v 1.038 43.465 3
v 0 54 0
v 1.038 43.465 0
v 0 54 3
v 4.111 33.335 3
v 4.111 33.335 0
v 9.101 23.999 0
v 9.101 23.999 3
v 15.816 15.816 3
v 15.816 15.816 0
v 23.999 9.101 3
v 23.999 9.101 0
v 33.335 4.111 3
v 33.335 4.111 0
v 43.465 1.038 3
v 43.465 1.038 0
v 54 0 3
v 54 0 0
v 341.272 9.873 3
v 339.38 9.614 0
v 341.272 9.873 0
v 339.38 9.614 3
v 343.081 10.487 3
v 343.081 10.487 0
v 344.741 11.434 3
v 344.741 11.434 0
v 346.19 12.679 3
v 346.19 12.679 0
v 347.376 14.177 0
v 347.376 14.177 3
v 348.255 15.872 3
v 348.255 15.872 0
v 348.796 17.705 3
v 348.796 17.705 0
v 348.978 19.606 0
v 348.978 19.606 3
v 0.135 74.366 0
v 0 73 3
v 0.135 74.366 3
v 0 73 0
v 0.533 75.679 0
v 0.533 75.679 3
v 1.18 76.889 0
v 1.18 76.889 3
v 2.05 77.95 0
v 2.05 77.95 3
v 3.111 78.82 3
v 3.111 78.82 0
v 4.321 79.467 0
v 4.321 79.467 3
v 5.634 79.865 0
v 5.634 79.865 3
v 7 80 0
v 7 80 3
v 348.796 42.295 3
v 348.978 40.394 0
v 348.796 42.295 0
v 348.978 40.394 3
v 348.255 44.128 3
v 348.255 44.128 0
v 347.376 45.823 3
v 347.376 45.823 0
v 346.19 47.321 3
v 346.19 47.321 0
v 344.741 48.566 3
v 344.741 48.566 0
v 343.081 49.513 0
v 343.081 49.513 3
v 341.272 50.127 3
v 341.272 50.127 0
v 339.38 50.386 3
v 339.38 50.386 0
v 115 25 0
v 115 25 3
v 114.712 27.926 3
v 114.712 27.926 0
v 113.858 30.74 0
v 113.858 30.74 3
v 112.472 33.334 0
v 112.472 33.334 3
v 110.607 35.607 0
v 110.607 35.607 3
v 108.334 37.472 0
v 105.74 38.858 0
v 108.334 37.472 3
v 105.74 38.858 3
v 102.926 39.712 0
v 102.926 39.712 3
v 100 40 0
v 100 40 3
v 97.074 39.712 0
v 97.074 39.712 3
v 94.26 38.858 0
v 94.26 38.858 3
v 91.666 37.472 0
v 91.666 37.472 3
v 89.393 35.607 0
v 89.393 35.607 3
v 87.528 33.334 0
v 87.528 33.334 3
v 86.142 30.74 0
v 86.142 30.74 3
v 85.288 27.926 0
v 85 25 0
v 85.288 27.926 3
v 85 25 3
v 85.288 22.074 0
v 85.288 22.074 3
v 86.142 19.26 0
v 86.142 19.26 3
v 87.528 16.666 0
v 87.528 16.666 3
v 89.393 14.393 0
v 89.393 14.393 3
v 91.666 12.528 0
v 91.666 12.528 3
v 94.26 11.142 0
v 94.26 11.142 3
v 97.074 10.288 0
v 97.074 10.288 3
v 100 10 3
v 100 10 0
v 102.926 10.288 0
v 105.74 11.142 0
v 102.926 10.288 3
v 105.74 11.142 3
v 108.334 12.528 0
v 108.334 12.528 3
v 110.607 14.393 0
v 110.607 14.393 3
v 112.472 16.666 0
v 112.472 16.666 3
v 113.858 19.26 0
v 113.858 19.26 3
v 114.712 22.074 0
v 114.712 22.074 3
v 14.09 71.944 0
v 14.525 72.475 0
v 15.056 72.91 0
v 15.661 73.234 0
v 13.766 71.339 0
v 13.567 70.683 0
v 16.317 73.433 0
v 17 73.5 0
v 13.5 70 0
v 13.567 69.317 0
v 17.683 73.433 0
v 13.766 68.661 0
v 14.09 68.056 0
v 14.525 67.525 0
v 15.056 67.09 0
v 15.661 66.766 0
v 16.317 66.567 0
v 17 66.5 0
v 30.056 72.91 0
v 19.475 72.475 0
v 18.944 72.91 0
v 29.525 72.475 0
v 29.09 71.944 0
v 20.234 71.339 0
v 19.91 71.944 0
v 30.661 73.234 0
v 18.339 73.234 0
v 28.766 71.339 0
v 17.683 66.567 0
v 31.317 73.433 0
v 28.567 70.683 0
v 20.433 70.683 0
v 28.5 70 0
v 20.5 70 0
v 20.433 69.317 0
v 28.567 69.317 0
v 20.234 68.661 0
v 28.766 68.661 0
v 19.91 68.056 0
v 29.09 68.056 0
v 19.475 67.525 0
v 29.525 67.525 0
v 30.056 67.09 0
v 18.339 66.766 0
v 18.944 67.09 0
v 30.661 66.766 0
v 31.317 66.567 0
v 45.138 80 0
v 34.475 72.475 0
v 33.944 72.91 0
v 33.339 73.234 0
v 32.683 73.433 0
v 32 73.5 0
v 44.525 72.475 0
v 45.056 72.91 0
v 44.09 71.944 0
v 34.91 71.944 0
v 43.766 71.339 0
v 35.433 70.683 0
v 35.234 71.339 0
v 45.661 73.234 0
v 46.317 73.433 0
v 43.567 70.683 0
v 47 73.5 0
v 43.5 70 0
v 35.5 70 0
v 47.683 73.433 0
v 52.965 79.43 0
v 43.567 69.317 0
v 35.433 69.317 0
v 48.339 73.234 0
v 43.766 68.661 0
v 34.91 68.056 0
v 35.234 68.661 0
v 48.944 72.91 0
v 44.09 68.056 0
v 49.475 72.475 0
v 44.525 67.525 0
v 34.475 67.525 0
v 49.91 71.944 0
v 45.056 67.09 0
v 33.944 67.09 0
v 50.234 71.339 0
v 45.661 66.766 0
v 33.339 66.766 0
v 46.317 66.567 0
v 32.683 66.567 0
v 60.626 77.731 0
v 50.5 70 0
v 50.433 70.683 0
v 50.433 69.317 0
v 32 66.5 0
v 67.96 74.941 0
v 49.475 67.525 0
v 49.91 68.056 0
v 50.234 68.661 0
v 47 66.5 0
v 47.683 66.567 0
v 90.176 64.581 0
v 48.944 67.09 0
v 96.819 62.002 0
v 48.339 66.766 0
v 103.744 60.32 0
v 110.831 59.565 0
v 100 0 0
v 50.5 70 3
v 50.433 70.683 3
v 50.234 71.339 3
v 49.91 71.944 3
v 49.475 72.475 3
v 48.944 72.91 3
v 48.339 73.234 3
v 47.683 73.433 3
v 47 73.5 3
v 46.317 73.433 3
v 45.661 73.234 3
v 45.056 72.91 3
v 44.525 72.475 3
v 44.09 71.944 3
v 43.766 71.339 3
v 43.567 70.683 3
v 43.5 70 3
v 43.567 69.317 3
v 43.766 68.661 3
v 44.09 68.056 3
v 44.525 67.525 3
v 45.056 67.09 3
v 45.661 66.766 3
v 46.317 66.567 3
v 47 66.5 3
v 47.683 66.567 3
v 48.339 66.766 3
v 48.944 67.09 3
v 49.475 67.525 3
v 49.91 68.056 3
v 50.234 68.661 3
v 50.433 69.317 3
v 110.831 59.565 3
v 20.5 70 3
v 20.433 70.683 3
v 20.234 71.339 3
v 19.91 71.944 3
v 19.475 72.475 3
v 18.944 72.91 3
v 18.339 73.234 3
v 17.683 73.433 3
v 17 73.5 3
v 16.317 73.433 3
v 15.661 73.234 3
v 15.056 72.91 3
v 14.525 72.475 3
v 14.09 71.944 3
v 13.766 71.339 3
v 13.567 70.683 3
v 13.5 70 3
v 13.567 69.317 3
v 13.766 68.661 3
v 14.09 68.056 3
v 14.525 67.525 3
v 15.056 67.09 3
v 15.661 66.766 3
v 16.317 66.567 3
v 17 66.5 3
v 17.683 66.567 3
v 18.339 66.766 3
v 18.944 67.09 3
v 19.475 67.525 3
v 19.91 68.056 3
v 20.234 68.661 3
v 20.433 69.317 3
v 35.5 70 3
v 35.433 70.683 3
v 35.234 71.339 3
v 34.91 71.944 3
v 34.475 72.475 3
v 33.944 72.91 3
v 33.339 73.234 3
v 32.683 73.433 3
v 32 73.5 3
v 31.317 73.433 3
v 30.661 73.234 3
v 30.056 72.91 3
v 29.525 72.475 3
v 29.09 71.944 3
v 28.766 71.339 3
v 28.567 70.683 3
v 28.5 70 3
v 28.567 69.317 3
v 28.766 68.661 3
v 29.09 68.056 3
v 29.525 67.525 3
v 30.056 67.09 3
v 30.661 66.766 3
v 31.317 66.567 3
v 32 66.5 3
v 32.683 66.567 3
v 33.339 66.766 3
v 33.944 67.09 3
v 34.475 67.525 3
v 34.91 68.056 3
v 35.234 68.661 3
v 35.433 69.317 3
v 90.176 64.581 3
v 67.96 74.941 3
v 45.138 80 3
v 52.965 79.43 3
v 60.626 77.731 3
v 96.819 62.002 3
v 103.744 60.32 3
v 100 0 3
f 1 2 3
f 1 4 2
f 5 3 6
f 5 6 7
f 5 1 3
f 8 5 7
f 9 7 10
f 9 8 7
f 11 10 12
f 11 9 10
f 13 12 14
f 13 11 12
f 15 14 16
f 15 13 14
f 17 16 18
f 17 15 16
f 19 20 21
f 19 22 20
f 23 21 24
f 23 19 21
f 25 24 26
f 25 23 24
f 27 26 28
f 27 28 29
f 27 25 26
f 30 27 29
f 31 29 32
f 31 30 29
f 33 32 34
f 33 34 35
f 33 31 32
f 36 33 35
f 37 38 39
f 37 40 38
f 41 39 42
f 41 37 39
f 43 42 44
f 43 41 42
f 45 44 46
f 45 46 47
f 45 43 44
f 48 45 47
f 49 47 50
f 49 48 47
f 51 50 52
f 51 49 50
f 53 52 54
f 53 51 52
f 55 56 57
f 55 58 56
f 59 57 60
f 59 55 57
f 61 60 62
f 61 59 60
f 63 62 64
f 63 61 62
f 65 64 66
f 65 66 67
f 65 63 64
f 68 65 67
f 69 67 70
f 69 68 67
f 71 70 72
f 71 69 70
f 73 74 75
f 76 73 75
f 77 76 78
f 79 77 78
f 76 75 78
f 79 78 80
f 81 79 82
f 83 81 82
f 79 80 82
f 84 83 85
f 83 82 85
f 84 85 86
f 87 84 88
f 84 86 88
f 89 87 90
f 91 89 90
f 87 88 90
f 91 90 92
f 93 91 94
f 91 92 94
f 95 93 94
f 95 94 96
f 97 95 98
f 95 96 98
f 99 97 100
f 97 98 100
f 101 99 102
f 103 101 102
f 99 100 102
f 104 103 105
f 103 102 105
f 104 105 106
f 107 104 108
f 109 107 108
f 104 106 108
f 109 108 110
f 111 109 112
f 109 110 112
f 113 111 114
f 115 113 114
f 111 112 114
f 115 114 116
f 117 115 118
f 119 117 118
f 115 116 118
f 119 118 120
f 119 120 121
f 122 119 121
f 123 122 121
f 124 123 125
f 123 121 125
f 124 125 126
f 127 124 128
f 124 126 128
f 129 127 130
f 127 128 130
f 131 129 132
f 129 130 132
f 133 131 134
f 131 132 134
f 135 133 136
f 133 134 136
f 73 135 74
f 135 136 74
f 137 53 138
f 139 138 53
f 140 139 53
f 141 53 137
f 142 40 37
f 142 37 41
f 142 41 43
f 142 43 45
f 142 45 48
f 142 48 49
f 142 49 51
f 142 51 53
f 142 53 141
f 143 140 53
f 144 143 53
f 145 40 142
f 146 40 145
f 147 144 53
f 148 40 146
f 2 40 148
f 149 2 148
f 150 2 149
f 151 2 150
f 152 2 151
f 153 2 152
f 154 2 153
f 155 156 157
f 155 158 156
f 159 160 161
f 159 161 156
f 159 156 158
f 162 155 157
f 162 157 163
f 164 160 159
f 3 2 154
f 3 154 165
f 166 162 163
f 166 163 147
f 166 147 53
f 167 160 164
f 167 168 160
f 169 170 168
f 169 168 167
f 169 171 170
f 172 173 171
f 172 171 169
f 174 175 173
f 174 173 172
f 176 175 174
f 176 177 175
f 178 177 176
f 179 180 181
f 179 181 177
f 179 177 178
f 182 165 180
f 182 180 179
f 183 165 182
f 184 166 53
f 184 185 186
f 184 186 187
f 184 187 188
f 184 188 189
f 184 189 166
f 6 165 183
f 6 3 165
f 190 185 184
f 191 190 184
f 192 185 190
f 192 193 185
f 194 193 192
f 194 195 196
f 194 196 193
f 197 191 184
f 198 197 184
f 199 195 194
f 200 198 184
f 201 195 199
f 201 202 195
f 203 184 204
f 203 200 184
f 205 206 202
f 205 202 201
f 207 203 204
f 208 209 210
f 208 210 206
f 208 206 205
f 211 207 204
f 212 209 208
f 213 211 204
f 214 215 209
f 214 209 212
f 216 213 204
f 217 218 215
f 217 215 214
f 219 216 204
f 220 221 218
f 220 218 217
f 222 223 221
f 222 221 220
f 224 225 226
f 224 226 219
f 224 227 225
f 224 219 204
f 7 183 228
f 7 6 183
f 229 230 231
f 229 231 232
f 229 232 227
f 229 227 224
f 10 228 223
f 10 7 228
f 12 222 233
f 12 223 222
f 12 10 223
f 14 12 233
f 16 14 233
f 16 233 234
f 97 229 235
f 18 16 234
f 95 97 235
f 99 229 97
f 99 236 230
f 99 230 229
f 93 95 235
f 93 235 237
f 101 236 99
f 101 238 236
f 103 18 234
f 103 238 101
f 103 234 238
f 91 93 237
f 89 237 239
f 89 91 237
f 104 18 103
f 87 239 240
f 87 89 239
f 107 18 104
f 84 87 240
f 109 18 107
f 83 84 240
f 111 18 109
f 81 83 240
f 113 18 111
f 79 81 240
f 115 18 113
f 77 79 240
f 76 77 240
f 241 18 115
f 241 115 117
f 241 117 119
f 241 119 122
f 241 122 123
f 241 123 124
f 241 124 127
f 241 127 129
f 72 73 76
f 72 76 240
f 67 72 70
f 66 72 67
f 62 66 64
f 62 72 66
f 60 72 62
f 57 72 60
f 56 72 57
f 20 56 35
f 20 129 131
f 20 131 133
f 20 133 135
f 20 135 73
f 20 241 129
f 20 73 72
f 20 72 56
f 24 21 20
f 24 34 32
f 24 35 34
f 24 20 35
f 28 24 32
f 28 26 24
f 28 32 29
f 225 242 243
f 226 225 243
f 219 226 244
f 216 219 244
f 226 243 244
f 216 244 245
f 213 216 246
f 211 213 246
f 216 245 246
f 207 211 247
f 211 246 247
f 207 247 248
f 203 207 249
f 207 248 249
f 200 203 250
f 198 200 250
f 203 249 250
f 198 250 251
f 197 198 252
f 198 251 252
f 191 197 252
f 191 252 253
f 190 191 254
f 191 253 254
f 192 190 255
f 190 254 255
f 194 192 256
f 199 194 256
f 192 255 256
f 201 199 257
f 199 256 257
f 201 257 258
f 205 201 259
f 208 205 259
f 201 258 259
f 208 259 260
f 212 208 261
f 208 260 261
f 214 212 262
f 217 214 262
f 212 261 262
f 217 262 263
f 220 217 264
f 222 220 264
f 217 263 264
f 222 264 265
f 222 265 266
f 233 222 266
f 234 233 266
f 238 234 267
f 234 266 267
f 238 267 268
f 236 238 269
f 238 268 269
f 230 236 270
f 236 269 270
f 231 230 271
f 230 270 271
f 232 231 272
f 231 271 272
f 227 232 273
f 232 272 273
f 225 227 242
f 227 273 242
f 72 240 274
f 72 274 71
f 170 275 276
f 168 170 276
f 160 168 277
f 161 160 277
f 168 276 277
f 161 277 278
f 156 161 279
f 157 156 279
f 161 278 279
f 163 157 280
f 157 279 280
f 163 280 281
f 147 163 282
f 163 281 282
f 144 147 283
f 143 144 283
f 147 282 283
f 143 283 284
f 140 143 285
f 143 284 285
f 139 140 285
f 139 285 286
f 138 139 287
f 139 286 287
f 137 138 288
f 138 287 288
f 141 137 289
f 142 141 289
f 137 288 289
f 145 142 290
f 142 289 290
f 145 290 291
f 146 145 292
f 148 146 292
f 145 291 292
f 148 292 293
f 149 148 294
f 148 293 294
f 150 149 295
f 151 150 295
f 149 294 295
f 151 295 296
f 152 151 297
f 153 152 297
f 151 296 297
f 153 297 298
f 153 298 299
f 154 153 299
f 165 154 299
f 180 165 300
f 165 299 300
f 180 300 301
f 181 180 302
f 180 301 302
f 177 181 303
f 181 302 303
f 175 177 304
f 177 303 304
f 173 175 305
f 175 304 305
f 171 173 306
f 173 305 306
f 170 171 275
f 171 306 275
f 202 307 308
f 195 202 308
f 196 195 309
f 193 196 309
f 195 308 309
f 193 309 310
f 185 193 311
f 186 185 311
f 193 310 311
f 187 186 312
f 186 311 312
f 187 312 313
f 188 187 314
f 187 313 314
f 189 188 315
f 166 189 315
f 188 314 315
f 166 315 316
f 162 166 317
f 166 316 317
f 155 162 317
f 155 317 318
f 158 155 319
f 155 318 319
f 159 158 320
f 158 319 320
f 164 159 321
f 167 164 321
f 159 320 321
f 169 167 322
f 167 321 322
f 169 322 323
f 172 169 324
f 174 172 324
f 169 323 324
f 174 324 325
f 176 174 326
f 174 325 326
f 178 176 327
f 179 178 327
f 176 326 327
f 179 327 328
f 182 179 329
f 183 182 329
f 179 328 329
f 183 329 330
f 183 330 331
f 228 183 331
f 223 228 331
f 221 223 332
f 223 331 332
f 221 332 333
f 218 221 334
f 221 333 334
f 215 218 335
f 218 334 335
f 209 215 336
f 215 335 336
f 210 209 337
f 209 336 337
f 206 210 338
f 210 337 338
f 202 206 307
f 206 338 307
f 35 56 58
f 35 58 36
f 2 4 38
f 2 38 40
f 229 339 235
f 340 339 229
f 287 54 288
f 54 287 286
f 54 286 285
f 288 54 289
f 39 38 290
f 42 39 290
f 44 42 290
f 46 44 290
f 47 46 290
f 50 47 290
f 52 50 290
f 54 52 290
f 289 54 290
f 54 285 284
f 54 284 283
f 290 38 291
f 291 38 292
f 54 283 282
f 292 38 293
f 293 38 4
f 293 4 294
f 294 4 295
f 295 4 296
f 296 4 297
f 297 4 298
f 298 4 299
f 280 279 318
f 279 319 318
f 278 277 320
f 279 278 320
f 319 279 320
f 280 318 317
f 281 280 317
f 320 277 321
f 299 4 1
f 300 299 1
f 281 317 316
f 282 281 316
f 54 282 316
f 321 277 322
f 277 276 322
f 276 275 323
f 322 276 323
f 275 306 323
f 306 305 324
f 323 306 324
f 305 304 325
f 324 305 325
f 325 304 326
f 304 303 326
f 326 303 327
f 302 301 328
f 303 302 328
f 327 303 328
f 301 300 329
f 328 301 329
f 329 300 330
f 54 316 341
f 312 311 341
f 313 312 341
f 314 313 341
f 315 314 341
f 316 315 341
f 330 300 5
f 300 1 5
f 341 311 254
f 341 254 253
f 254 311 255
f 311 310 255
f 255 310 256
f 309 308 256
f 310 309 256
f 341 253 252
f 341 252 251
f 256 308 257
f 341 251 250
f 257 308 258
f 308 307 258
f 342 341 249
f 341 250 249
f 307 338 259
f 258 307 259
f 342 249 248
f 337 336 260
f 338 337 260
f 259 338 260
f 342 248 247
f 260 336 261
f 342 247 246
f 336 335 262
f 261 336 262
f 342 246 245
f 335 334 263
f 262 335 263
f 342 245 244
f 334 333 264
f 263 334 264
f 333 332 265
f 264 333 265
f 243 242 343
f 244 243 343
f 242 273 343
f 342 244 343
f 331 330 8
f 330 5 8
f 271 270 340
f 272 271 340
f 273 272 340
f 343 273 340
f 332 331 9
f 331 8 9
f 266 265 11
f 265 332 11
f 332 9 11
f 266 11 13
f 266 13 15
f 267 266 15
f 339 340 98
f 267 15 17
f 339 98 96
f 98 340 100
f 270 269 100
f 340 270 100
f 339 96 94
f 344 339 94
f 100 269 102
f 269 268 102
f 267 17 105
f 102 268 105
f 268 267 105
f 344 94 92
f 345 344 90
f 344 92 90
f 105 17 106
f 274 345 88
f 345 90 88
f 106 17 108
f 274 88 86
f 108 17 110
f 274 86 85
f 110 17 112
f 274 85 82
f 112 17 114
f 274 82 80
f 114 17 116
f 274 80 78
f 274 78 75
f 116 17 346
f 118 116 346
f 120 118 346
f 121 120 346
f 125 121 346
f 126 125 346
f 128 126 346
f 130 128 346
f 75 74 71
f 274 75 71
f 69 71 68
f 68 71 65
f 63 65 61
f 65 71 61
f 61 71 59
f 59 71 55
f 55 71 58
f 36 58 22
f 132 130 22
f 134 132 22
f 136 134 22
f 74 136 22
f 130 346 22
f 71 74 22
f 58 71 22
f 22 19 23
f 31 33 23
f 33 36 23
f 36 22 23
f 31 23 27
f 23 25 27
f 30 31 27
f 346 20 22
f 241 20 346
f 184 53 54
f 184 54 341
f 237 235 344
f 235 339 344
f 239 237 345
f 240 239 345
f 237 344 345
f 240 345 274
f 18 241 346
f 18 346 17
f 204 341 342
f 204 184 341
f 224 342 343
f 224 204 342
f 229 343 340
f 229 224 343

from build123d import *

# Parameters (mm, degrees)
BOSS_EXTRU_1_DEPTH      = 3
ESQUISSE2_R             = 15
ENL_V_MAT_EXTRU_1_DEPTH = 3
ESQUISSE3_W             = 100
ESQUISSE3_H             = 3
BOSS_EXTRU_2_DEPTH      = 20
ESQUISSE4_R             = 3.5
ENL_V_MAT_EXTRU_2_DEPTH = 3
ENL_V_MAT_EXTRU_3_DEPTH = 3
CONG_1_R                = 54
CONG_3_R                = 54
CONG_4_R                = 10
CONG_5_R                = 7


with BuildPart() as part:
    # Esquisse1 → Boss.-Extru.1 (new body)
    with BuildSketch(Plane.XY):
        Polygon((0, 0), (0, 60), (100, 60), (348.978261886, 50), (348.978261886, 10), (100, 0), align=None)
    extrude(amount=BOSS_EXTRU_1_DEPTH)

    # Esquisse2 → Enlèv. mat.-Extru.1 (cut)
    with BuildSketch(Plane.XY.offset(3)):
        with Locations((100, 25)):
            Circle(ESQUISSE2_R)
    extrude(amount=-ENL_V_MAT_EXTRU_1_DEPTH, mode=Mode.SUBTRACT)

    # Esquisse3 → Boss.-Extru.2 (add)
    with BuildSketch(Plane(origin=(0, 60, 0), x_dir=(1, 0, 0), z_dir=(0, 1, 0))):
        with Locations((50, -1.5)):
            Rectangle(ESQUISSE3_W, ESQUISSE3_H)
    extrude(amount=BOSS_EXTRU_2_DEPTH)

    # Esquisse4 → Enlèv. mat.-Extru.2 (cut)
    with BuildSketch(Plane.XY.offset(3)):
        with Locations((47, 70)):
            Circle(ESQUISSE4_R)
        with Locations((32, 70)):
            Circle(ESQUISSE4_R)
        with Locations((17, 70)):
            Circle(ESQUISSE4_R)
    extrude(amount=-ENL_V_MAT_EXTRU_2_DEPTH, mode=Mode.SUBTRACT)

    # Esquisse5 → Enlèv. mat.-Extru.3 (cut)
    with BuildSketch(Plane.XY.offset(3)):
        Polygon((100, 60), (57.10986159, 80), (100, 80), align=None)
    extrude(amount=-ENL_V_MAT_EXTRU_3_DEPTH, mode=Mode.SUBTRACT)

    # Congé1
    cong_1_edges = [part.edges().sort_by_distance(p)[0] for p in [
        (100, 60, 1.5),
        (57.10986159, 80, 1.5),
    ]]
    fillet(cong_1_edges, radius=CONG_1_R)

    # Congé3
    cong_3_edges = [part.edges().sort_by_distance(p)[0] for p in [
        (0, 0, 1.5),
    ]]
    fillet(cong_3_edges, radius=CONG_3_R)

    # Congé4
    cong_4_edges = [part.edges().sort_by_distance(p)[0] for p in [
        (348.978261886, 50, 1.5),
        (348.978261886, 10, 1.5),
    ]]
    fillet(cong_4_edges, radius=CONG_4_R)

    # Congé5
    cong_5_edges = [part.edges().sort_by_distance(p)[0] for p in [
        (0, 80, 1.5),
    ]]
    fillet(cong_5_edges, radius=CONG_5_R)


solid = part.part
